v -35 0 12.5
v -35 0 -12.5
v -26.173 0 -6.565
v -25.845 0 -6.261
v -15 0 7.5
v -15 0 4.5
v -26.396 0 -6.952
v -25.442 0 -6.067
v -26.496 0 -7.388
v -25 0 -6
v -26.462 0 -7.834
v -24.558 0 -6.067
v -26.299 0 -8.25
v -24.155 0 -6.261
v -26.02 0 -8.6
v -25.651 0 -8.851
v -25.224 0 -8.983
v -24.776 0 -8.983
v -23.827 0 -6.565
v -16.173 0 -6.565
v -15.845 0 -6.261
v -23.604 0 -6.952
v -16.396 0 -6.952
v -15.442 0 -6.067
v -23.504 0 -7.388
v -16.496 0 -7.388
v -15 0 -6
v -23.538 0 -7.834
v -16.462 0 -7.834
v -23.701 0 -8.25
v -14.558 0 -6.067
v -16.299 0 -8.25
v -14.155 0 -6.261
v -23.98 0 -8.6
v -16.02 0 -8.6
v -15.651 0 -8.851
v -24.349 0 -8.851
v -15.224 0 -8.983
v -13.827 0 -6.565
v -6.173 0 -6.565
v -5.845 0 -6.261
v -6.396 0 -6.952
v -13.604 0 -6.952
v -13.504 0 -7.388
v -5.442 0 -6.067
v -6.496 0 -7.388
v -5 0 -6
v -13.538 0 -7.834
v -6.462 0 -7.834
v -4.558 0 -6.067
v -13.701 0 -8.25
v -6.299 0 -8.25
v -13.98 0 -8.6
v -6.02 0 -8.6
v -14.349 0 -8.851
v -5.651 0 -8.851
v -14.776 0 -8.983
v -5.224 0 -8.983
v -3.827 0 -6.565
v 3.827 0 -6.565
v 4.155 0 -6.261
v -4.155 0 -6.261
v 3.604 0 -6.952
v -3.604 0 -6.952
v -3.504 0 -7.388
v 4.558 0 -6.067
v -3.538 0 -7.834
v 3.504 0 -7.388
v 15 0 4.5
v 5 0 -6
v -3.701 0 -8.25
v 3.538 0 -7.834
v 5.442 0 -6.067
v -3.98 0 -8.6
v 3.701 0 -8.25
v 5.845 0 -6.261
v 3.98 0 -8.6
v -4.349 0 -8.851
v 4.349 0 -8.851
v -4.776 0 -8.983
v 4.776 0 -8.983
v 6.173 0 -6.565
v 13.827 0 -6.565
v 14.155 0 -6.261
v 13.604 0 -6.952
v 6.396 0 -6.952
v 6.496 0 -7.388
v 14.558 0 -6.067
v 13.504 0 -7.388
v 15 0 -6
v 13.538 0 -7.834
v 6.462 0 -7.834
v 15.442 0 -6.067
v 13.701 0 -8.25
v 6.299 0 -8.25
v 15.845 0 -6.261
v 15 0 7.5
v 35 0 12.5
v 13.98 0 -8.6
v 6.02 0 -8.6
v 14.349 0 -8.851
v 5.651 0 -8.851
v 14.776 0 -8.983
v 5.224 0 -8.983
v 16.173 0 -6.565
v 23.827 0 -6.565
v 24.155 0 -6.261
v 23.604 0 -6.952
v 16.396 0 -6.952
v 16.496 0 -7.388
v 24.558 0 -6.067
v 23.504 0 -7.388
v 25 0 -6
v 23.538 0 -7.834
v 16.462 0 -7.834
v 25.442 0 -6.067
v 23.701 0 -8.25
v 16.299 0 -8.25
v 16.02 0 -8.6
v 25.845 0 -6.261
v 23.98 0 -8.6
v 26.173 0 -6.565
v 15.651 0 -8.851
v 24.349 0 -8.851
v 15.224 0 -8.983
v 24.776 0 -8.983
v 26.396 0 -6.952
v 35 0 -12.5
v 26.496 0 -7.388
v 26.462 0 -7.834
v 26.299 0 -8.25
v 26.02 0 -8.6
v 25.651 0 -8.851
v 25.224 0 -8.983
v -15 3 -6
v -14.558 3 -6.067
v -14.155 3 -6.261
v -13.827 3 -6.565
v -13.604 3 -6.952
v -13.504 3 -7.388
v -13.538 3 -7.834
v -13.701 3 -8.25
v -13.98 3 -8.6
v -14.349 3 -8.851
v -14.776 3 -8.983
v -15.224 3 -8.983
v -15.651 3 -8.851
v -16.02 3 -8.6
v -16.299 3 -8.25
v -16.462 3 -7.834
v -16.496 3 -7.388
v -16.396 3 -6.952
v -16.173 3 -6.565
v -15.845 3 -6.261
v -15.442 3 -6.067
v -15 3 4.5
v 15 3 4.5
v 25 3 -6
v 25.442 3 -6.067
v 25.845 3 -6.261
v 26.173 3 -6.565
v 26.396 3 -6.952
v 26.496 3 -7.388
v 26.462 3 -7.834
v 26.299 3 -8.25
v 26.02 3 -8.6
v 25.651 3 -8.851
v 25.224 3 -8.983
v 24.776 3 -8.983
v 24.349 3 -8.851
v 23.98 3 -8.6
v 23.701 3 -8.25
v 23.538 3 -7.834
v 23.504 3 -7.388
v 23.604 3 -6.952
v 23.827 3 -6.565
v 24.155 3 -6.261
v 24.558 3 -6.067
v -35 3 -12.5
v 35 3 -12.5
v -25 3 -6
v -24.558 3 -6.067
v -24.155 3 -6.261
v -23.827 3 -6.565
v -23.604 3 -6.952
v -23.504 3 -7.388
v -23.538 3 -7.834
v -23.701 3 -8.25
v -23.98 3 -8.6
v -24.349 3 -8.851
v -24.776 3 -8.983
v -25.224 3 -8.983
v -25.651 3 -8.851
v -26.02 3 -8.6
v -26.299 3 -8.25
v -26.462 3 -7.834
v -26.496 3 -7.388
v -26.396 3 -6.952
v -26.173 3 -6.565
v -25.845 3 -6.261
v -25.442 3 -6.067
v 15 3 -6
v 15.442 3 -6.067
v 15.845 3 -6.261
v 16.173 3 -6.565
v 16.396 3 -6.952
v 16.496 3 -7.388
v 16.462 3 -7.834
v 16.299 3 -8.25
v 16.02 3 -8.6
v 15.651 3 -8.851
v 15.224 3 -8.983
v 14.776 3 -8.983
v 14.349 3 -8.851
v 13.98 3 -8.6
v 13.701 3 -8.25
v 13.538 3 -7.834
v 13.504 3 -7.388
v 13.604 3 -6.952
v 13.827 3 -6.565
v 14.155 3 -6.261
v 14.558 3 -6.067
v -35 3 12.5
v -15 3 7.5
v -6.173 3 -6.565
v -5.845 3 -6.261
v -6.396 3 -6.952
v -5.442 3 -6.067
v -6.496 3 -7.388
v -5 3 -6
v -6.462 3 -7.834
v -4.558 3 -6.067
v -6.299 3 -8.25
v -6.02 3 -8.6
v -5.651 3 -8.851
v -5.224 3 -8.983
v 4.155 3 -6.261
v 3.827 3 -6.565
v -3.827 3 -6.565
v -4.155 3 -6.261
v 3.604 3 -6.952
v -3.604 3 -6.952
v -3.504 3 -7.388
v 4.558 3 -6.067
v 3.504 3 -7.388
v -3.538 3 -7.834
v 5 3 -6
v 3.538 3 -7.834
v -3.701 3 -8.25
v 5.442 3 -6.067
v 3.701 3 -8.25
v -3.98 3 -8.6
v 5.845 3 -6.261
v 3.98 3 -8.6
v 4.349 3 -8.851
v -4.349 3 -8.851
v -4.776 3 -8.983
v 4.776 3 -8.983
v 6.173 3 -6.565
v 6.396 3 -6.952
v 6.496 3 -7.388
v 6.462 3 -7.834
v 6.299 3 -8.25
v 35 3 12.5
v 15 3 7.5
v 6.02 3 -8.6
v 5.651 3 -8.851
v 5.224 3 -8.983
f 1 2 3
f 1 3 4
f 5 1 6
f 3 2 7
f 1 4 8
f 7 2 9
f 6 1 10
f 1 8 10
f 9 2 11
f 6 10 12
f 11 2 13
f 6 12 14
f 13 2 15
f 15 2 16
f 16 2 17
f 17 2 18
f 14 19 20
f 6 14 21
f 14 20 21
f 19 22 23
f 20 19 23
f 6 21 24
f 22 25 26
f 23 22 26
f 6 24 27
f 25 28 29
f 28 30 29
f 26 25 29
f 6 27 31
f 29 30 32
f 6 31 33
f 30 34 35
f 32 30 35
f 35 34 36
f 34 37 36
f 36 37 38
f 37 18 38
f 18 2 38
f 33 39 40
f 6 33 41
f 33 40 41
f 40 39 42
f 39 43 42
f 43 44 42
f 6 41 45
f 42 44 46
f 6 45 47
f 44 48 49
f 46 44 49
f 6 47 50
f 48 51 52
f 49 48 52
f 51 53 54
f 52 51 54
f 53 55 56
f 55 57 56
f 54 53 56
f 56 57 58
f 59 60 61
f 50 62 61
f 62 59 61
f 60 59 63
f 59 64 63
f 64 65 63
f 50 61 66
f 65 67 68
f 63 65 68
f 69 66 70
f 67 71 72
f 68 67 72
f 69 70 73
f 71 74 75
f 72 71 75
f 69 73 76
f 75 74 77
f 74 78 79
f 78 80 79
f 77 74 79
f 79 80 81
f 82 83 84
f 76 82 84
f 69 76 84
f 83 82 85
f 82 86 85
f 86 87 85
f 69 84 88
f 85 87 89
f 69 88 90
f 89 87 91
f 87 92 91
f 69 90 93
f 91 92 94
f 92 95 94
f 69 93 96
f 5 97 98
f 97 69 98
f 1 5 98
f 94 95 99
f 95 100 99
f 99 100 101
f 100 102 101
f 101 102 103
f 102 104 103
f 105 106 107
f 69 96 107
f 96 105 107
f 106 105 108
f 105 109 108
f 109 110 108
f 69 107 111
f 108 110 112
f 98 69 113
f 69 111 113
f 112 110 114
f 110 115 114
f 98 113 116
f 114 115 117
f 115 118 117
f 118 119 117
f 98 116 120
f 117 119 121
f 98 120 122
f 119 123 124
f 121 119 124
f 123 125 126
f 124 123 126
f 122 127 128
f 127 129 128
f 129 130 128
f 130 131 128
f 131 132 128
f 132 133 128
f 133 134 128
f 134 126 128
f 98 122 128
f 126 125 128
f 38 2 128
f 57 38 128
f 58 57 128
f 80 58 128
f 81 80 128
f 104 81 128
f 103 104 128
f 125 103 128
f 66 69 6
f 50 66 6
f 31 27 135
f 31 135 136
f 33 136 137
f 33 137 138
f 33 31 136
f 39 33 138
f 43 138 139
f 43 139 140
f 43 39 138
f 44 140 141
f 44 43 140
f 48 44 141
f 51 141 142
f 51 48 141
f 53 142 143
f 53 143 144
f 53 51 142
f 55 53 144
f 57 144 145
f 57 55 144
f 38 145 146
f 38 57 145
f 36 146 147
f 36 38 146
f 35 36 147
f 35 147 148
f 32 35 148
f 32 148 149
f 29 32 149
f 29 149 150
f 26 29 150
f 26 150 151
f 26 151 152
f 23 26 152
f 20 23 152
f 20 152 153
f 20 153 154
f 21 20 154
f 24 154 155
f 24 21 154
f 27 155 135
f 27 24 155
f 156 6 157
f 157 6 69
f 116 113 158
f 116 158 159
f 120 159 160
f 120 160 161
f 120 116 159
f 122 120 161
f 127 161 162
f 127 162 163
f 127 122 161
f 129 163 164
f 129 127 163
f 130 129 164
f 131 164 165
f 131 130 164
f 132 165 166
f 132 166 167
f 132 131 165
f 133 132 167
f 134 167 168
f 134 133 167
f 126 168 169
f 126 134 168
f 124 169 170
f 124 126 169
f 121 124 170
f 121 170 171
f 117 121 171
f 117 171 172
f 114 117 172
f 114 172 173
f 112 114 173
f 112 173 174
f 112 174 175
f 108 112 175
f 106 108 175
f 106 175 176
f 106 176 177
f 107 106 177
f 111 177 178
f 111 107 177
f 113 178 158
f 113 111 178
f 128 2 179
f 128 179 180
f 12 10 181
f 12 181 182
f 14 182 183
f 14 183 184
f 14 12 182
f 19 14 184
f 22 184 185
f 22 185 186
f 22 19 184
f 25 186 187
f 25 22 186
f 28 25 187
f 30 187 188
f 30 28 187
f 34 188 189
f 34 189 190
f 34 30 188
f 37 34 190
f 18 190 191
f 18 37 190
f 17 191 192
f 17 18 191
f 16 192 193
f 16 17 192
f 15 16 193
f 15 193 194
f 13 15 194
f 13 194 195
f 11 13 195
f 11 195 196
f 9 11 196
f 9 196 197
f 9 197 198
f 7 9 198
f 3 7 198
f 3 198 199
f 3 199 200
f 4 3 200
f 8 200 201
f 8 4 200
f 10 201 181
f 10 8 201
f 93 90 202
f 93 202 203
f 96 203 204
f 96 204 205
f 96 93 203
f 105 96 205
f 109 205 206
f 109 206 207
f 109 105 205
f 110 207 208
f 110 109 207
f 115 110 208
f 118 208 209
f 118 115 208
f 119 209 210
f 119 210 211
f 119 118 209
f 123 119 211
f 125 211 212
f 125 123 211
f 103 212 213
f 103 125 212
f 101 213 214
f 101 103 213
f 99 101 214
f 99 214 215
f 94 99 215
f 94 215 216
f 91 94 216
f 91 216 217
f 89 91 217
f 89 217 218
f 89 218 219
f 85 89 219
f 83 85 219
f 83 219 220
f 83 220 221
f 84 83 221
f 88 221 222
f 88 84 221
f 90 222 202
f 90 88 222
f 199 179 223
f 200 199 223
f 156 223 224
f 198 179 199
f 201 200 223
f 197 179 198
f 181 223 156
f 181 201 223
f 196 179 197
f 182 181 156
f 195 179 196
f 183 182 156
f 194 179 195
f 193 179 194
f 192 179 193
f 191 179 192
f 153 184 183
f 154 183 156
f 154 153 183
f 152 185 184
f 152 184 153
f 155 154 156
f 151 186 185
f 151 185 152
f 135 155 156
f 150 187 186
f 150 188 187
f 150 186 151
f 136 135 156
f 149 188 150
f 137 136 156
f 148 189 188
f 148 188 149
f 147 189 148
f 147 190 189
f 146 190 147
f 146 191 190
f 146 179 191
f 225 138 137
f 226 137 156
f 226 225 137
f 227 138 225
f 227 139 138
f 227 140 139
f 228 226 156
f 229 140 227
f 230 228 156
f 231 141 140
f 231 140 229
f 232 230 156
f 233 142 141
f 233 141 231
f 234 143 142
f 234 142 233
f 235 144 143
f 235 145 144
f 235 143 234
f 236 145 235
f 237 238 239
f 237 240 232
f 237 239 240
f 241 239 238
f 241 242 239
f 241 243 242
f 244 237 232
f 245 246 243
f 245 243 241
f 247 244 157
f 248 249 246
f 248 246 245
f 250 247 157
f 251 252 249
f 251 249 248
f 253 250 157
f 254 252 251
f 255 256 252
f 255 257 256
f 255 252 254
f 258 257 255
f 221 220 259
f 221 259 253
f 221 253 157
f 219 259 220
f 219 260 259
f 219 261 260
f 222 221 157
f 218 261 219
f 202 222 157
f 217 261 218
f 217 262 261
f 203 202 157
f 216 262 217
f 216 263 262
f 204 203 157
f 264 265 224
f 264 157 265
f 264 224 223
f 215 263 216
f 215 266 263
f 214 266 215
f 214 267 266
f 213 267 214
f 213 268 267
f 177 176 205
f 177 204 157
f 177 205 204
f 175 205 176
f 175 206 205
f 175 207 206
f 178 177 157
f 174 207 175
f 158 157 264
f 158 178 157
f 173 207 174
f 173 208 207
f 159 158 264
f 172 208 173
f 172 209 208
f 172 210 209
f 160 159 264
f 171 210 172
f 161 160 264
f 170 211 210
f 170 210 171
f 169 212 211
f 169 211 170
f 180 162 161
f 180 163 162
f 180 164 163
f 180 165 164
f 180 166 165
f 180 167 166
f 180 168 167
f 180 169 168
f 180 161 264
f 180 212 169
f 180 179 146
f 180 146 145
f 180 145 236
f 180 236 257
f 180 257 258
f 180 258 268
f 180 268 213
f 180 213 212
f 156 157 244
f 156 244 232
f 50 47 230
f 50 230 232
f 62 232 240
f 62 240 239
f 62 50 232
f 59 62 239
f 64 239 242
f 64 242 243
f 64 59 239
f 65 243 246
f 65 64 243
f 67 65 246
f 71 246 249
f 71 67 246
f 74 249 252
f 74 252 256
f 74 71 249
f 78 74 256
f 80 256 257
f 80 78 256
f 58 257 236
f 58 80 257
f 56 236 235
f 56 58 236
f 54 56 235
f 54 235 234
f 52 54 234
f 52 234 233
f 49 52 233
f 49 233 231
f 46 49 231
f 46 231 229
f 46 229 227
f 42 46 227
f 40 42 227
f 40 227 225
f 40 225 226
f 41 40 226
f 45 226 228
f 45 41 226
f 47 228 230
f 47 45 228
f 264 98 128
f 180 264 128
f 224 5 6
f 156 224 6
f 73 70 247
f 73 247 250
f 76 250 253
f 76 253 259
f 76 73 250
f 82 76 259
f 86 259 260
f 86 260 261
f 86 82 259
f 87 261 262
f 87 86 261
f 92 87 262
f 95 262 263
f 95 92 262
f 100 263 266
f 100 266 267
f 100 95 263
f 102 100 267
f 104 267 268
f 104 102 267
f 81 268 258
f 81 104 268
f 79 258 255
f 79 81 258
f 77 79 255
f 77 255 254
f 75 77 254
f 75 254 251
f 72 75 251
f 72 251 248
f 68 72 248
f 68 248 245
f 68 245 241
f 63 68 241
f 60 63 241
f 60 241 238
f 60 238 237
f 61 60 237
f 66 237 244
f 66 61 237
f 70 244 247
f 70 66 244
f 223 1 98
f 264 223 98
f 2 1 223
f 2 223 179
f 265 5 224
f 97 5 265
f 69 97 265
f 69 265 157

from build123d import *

# Parameters (mm, degrees)
SKETCH1_W           = 70
SKETCH1_H           = 25
SKETCH1_R           = 1.5
SKETCH1_W_2         = 30
SKETCH1_H_2         = 3
BOSS_EXTRUDE1_DEPTH = 3


with BuildPart() as part:
    # Sketch1 → Boss-Extrude1 (new body)
    with BuildSketch(Plane(origin=(0, 0, 0), x_dir=(1, 0, 0), z_dir=(0, 1, 0))):
        Rectangle(SKETCH1_W, SKETCH1_H)
        with Locations(Location((-25, 7.5, 0), (0, 0, 270))):
            Circle(SKETCH1_R, mode=Mode.SUBTRACT)
        with Locations(Location((-15, 7.5, 0), (0, 0, 270))):
            Circle(SKETCH1_R, mode=Mode.SUBTRACT)
        with Locations(Location((-5, 7.5, 0), (0, 0, 270))):
            Circle(SKETCH1_R, mode=Mode.SUBTRACT)
        with Locations(Location((5, 7.5, 0), (0, 0, 270))):
            Circle(SKETCH1_R, mode=Mode.SUBTRACT)
        with Locations(Location((15, 7.5, 0), (0, 0, 270))):
            Circle(SKETCH1_R, mode=Mode.SUBTRACT)
        with Locations(Location((25, 7.5, 0), (0, 0, 270))):
            Circle(SKETCH1_R, mode=Mode.SUBTRACT)
        with Locations((0, -6)):
            Rectangle(SKETCH1_W_2, SKETCH1_H_2, mode=Mode.SUBTRACT)
    extrude(amount=BOSS_EXTRUDE1_DEPTH)


solid = part.part
